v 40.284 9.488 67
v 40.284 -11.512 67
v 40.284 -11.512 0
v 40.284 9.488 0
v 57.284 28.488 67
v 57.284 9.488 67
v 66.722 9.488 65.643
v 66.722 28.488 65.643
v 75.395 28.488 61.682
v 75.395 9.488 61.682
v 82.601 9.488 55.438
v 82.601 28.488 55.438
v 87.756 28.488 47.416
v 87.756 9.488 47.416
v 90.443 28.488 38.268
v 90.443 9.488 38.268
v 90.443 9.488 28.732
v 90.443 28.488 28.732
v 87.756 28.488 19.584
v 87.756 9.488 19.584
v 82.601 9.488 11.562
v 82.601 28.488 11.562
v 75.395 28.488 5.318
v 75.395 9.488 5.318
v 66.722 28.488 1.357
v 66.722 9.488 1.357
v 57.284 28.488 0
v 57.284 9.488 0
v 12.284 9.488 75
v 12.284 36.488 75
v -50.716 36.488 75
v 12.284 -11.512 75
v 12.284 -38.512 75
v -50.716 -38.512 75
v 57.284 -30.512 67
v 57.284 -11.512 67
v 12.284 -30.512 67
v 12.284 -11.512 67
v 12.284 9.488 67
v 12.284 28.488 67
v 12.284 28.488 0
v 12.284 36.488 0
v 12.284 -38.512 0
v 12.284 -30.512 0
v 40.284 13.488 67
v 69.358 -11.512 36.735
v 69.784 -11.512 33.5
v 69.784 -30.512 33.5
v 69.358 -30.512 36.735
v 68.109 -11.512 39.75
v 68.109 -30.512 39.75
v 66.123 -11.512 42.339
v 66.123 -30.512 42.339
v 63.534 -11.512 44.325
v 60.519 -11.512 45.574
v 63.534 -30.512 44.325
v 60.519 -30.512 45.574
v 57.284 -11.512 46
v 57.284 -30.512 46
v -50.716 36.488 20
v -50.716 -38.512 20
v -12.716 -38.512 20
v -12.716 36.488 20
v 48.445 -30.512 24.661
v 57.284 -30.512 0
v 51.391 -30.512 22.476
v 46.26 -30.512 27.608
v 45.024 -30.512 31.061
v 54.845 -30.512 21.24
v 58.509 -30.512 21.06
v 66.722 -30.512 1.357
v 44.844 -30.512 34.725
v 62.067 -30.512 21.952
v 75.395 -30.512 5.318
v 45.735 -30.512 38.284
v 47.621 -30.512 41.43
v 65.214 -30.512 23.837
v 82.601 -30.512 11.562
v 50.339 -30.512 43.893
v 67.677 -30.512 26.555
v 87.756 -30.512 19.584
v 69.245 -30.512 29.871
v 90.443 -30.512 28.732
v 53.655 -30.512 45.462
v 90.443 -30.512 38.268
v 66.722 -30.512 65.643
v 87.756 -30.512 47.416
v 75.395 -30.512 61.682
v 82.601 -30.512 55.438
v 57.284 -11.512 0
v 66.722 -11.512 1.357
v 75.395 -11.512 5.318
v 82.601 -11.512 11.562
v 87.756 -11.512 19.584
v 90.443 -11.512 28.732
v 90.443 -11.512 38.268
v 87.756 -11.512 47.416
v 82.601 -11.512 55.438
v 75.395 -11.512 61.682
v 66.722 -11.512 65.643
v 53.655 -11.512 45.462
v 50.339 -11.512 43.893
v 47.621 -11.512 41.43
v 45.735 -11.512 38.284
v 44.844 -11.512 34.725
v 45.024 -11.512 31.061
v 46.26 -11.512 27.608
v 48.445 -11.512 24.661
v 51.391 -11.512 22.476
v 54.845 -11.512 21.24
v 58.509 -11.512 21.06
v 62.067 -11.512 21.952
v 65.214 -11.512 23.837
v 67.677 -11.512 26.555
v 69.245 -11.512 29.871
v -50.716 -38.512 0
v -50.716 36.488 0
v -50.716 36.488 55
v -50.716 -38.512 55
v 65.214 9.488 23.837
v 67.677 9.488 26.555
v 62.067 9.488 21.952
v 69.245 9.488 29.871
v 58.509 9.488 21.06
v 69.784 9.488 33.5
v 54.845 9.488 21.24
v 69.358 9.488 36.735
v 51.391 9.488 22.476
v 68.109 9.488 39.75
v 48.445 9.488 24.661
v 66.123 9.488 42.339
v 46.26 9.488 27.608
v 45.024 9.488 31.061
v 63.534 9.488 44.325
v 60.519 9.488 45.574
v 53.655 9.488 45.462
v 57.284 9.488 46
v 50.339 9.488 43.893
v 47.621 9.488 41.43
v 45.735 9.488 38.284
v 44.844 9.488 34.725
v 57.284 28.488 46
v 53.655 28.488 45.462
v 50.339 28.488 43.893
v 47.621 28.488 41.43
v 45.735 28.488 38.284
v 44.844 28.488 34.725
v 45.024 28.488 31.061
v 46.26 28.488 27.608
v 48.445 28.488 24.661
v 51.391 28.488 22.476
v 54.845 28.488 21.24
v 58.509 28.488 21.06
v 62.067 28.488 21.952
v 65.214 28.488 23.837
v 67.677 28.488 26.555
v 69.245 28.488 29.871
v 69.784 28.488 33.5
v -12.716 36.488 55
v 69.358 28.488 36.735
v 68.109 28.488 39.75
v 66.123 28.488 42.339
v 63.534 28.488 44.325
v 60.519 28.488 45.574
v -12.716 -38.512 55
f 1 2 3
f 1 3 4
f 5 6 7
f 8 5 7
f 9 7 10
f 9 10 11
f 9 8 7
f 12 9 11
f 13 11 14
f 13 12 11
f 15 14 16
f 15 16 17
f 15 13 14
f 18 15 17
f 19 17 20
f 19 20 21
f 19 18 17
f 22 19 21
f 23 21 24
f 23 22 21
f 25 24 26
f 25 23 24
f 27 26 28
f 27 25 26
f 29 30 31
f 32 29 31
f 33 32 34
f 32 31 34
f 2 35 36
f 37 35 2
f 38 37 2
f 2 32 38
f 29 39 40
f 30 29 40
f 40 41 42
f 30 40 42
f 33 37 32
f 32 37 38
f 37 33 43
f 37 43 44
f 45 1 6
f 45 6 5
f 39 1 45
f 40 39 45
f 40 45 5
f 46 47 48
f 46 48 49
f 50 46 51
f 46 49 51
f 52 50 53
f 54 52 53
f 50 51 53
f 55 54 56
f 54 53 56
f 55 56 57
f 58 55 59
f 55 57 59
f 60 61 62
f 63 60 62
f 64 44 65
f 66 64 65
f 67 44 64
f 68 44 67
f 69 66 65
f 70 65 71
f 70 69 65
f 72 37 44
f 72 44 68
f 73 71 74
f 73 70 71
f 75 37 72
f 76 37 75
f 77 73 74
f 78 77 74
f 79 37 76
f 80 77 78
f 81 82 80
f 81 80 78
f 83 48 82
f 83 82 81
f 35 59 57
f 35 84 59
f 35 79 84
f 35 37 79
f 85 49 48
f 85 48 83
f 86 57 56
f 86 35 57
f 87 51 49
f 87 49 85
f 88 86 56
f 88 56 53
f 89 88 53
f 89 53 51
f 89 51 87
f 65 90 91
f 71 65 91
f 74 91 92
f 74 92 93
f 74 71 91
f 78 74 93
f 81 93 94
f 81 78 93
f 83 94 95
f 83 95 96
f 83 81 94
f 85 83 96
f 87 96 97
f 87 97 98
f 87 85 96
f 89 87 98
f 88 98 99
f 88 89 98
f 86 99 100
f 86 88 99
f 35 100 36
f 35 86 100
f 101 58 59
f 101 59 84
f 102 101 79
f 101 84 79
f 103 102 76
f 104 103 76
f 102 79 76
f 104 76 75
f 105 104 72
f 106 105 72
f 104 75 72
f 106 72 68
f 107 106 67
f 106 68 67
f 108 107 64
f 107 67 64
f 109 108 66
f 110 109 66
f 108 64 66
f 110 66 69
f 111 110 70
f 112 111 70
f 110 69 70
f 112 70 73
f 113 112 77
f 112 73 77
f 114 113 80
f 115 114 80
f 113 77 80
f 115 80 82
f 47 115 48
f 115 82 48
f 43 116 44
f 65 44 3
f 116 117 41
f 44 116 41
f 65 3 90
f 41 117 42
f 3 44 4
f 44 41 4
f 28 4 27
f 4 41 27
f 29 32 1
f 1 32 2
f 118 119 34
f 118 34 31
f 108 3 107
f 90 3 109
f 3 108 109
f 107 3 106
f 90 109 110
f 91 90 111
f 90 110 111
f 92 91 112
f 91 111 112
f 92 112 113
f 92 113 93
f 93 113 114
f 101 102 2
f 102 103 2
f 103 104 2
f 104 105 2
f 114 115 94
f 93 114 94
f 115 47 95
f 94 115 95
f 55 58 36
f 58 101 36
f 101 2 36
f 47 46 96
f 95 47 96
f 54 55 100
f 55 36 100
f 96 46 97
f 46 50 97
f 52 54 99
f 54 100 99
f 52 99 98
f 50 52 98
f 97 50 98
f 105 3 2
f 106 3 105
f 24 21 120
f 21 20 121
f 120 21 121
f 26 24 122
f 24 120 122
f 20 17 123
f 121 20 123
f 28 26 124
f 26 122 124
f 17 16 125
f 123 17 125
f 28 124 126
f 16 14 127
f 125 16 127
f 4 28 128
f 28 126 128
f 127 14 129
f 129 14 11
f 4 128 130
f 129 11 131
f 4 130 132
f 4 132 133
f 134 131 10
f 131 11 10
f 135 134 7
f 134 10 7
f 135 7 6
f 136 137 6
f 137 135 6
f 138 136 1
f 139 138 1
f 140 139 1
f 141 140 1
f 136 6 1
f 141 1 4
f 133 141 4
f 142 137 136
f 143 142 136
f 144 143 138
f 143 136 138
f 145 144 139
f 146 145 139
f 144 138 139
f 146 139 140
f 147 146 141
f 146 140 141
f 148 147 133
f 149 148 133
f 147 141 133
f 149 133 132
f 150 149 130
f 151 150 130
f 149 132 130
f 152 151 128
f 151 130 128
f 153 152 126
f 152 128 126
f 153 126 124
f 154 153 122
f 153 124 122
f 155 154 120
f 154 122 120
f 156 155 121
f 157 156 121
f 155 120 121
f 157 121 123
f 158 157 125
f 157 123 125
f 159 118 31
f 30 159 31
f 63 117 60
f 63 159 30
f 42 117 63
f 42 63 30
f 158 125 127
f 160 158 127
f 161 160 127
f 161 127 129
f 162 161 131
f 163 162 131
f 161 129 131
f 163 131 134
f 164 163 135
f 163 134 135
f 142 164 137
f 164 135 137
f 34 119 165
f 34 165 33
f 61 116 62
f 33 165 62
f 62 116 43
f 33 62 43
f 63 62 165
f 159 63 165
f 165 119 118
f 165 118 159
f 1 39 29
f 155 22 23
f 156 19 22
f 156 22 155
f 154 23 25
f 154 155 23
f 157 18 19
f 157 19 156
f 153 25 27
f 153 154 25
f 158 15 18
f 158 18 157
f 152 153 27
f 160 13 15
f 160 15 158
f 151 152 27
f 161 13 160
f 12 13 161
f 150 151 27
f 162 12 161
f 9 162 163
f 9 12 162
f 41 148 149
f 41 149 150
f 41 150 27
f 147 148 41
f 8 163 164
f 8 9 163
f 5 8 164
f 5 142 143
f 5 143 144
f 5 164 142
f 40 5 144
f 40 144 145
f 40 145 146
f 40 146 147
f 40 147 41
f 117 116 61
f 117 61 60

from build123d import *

# Parameters (mm, degrees)
F0_W      = 63
F0_H      = 75
F1_DEPTH  = 75
F2_W      = 38
F2_H      = 35
F3_DEPTH  = 75
F4_W      = 19
F4_H      = 67
F5_DEPTH  = 45
F7_DEPTH  = 28
F9_DEPTH  = 25
F11_DEPTH = 19
F13_DEPTH = 19
F15_DEPTH = 100


with BuildPart() as f1:
    # F0 (on Top) → F1 (new body)
    with BuildSketch(Plane.XY):
        with Locations((-19.216308, -1.011902)):
            Rectangle(F0_W, F0_H)
    extrude(amount=F1_DEPTH)

    # F2 (on face) → F3 (cut)
    with BuildSketch(Plane.XZ.offset(38.511902)):
        with Locations((-31.716308, 37.5)):
            Rectangle(F2_W, F2_H)
    extrude(amount=-F3_DEPTH, mode=Mode.SUBTRACT)

    # F4 (on face) → F5 (join)
    with BuildSketch(Plane.YZ.offset(12.283692)):
        with Locations((-21.011902, 33.5)):
            Rectangle(F4_W, F4_H)
        with Locations((18.988098, 33.5)):
            Rectangle(F4_W, F4_H)
    extrude(amount=F5_DEPTH)

    # F6 (on face) → F7 (join)
    with BuildSketch(Plane.YZ.offset(12.283692)):
        Polygon((-11.511902, 75), (-11.511902, 67), (-11.511902, 0), (9.488098, 0), (9.488098, 67), (9.488098, 75), align=None)
    extrude(amount=F7_DEPTH)

    # F8 (on face) → F9 (cut)
    with BuildSketch(Plane.XZ.offset(11.511902)):
        Polygon((40.283692, 75), (12.283692, 75), (40.283692, 67), align=None)
    extrude(amount=-F9_DEPTH, mode=Mode.SUBTRACT)

    # F10 (on face) → F11 (join)
    with BuildSketch(Plane.XZ.offset(30.511902)):
        with BuildLine():
            Line((57.283692, 67), (57.283692, 0))
            ThreePointArc((57.283692, 0), (90.783692, 33.5), (57.283692, 67))
        make_face()
    extrude(amount=-F11_DEPTH)

    # F12 (on face) → F13 (join)
    with BuildSketch(Plane(origin=(0, 28.488098, 0), x_dir=(-1, 0, 0), z_dir=(0, 1, 0))):
        with BuildLine():
            Line((-57.283692, 0), (-57.283692, 67))
            ThreePointArc((-57.283692, 67), (-90.783692, 33.5), (-57.283692, 0))
        make_face()
    extrude(amount=-F13_DEPTH)

    # F14 (on face) → F15 (cut)
    with BuildSketch(Plane.XZ.offset(30.511902)):
        with BuildLine():
            ThreePointArc((69.783692, 33.5), (66.122527, 42.338835), (57.283692, 46))
            ThreePointArc((57.283692, 46), (48.444857, 24.661165), (69.783692, 33.5))
        make_face()
    extrude(amount=-F15_DEPTH, mode=Mode.SUBTRACT)


solid = f1.part
